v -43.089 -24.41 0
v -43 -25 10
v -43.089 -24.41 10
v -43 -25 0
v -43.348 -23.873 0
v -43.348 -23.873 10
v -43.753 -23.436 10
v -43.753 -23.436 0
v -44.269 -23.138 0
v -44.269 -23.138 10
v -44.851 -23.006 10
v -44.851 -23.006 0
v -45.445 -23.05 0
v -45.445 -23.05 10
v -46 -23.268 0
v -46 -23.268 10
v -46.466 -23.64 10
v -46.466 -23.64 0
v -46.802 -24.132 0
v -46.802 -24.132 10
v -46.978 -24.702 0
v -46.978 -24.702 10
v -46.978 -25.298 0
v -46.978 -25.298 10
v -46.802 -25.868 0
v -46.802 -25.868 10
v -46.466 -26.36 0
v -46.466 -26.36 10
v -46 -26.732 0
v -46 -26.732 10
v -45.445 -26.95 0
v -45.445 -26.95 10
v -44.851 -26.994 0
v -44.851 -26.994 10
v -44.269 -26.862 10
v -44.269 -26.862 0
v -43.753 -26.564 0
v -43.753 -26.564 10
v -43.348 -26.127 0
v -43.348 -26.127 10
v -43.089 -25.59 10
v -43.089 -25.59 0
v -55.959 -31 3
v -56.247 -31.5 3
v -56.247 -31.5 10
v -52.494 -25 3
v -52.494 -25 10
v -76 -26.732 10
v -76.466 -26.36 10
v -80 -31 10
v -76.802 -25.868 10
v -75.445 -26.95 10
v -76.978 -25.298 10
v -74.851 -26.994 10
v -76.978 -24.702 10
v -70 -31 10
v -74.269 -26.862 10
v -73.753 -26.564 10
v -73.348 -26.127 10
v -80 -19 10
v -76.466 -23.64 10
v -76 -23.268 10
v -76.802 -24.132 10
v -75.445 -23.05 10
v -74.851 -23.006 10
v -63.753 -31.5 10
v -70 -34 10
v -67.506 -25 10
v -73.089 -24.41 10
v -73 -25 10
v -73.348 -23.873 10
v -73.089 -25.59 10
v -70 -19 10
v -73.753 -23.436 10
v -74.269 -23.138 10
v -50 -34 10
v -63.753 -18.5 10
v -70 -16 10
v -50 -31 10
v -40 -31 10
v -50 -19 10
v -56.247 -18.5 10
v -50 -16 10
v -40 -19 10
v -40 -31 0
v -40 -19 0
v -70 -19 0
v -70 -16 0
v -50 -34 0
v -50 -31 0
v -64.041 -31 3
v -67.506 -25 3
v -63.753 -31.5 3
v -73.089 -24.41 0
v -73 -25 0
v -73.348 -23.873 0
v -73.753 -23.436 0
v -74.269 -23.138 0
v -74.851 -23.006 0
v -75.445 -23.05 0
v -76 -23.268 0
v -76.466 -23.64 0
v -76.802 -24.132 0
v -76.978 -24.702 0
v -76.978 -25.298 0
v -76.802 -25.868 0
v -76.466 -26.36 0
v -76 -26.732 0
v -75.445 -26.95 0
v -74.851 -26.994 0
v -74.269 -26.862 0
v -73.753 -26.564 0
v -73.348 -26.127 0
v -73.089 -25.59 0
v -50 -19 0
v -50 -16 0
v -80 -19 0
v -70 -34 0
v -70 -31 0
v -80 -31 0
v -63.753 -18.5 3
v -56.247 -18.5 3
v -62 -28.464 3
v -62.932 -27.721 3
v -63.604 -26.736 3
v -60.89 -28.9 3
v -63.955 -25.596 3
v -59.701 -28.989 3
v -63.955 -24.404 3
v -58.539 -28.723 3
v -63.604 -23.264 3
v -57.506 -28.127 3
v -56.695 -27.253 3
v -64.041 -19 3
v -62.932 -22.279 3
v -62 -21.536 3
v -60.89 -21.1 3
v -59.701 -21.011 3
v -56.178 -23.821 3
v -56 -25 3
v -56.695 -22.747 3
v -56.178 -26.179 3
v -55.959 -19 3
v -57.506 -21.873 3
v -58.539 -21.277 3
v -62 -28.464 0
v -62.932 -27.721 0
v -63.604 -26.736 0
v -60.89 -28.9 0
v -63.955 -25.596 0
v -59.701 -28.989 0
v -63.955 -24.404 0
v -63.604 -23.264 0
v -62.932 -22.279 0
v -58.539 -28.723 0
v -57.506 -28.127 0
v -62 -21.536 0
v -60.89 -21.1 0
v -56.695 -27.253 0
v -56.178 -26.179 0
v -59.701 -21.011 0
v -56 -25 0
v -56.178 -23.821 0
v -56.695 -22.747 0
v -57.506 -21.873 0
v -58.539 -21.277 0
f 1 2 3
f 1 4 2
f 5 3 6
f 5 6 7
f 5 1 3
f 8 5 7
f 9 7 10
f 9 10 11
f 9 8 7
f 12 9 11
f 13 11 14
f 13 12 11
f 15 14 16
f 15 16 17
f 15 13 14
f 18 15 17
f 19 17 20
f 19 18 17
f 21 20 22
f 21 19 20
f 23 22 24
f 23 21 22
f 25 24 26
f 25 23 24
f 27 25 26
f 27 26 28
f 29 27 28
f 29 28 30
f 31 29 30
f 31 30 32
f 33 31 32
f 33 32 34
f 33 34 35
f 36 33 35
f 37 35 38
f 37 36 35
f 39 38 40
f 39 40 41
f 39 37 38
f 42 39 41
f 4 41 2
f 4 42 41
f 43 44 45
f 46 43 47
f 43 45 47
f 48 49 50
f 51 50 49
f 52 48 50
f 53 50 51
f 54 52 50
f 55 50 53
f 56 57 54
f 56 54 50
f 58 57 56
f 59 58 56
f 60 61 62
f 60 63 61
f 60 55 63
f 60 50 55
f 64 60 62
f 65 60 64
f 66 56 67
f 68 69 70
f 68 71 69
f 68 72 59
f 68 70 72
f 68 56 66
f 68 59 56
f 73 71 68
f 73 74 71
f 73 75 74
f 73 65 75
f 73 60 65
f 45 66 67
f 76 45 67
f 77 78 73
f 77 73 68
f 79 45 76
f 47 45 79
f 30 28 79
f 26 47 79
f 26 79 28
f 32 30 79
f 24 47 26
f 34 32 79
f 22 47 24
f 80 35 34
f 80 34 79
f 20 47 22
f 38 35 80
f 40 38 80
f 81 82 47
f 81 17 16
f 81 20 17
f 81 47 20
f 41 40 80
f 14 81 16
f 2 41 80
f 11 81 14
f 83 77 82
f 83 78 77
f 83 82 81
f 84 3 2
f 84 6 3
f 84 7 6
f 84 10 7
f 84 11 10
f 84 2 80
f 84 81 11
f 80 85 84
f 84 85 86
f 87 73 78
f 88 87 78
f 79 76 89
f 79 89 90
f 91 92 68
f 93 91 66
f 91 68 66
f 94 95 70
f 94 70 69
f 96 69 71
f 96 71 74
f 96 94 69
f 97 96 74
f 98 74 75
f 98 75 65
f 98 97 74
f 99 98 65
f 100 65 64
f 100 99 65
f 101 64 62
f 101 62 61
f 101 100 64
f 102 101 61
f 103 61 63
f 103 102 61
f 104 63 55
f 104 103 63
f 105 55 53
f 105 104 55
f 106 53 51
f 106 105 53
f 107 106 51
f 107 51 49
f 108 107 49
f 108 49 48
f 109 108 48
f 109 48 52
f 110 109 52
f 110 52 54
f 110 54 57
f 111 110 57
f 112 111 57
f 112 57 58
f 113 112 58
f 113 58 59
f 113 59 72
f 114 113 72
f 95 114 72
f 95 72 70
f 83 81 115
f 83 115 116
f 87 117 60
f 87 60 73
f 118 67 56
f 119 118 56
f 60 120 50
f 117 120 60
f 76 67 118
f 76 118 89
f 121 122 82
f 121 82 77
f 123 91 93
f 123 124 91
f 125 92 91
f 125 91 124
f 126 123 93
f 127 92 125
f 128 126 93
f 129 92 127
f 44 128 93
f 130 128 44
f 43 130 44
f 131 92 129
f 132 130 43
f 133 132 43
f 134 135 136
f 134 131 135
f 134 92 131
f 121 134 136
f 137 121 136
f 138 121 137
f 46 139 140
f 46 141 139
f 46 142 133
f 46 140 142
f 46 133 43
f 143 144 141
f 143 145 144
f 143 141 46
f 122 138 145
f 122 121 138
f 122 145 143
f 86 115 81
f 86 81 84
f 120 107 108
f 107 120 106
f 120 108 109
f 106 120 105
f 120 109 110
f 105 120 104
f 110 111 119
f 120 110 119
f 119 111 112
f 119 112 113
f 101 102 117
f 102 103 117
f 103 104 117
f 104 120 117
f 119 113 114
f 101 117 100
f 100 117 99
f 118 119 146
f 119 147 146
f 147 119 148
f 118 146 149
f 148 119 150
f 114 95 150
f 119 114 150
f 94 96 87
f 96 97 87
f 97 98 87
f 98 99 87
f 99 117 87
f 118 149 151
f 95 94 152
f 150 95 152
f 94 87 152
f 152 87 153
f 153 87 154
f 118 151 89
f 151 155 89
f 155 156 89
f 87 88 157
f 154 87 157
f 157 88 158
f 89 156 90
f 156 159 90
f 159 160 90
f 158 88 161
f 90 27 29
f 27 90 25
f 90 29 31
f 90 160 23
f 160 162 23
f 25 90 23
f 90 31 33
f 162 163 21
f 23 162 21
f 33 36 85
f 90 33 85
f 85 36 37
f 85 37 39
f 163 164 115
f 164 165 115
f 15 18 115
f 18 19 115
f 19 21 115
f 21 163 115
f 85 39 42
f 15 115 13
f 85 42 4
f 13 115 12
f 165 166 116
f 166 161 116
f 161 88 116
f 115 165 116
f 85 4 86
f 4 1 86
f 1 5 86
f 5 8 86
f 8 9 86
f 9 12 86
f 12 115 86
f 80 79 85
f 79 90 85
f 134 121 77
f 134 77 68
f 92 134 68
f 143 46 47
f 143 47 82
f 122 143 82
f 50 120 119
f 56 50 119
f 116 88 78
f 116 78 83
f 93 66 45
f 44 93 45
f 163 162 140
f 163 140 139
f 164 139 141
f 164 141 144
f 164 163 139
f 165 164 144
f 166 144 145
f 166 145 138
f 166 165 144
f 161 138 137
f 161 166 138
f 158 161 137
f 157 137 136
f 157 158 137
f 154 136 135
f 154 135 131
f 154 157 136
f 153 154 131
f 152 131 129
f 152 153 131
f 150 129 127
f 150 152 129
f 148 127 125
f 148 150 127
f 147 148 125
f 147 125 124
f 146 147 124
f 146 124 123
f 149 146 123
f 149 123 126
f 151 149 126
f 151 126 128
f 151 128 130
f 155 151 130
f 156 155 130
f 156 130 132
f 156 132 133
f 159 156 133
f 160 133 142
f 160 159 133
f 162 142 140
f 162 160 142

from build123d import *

# Parameters (mm, degrees)
SKETCH1_W           = 40
SKETCH1_H           = 12
SKETCH1_R           = 2
SKETCH1_R_2         = 4
BOSS_EXTRUDE1_DEPTH = 3
SKETCH2_W           = 20
SKETCH2_H           = 18
BOSS_EXTRUDE2_DEPTH = 7
SKETCH2_4_W         = 20
SKETCH2_4_H         = 18
BOSS_EXTRUDE3_DEPTH = 3
SKETCH3_W           = 10
SKETCH3_H           = 12
SKETCH3_R           = 2
BOSS_EXTRUDE4_DEPTH = 7
BOSS_EXTRUDE5_DEPTH = 3


with BuildPart() as part:
    # Sketch1 → Boss-Extrude1 (new body)
    with BuildSketch(Plane.XY):
        with Locations((-60, -25)):
            Rectangle(SKETCH1_W, SKETCH1_H)
        with Locations((-45, -25)):
            Circle(SKETCH1_R, mode=Mode.SUBTRACT)
        with Locations((-75, -25)):
            Circle(SKETCH1_R, mode=Mode.SUBTRACT)
        with Locations((-60, -25)):
            Circle(SKETCH1_R_2, mode=Mode.SUBTRACT)
    extrude(amount=BOSS_EXTRUDE1_DEPTH)

    # Sketch2 → Boss-Extrude2 (add)
    with BuildSketch(Plane.XY.offset(3)):
        with Locations((-60, -25)):
            Rectangle(SKETCH2_W, SKETCH2_H)
        Polygon((-56.24722325, -18.5), (-63.75277675, -18.5), (-67.505553499, -25), (-63.75277675, -31.5), (-56.24722325, -31.5), (-52.494446501, -25), align=None, mode=Mode.SUBTRACT)
    extrude(amount=BOSS_EXTRUDE2_DEPTH)

    # Sketch2<4> → Boss-Extrude3 (add)
    with BuildSketch(Plane.XY.offset(3)):
        with Locations((-60, -25)):
            Rectangle(SKETCH2_4_W, SKETCH2_4_H)
        Polygon((-56.24722325, -18.5), (-63.75277675, -18.5), (-67.505553499, -25), (-63.75277675, -31.5), (-56.24722325, -31.5), (-52.494446501, -25), align=None, mode=Mode.SUBTRACT)
    extrude(amount=-BOSS_EXTRUDE3_DEPTH)

    # Sketch3 → Boss-Extrude4 (add)
    # profile 1 of 6: a face of its own
    with BuildSketch(Plane.XY.offset(3)):
        Polygon((-50, -19), (-55.958548116, -19), (-52.494446501, -25), (-55.958548116, -31), (-50, -31), align=None)
    # profile 2 of 6: a face of its own
    with BuildSketch(Plane.XY.offset(3)):
        Polygon((-64.041451884, -31), (-70, -31), (-70, -34), (-50, -34), (-50, -31), (-55.958548116, -31), (-56.24722325, -31.5), (-63.75277675, -31.5), align=None)
    # profile 3 of 6: a face of its own
    with BuildSketch(Plane.XY.offset(3)):
        Polygon((-64.041451884, -19), (-70, -19), (-70, -31), (-64.041451884, -31), (-67.505553499, -25), align=None)
    # profile 4 of 6: a face of its own
    with BuildSketch(Plane.XY.offset(3)):
        Polygon((-70, -16), (-70, -19), (-64.041451884, -19), (-63.75277675, -18.5), (-56.24722325, -18.5), (-55.958548116, -19), (-50, -19), (-50, -16), align=None)
    # profile 5 of 6: a face of its own
    with BuildSketch(Plane.XY.offset(3)):
        with Locations((-75, -25)):
            Rectangle(SKETCH3_W, SKETCH3_H)
        with Locations((-75, -25)):
            Circle(SKETCH3_R, mode=Mode.SUBTRACT)
    # profile 6 of 6: a face of its own
    with BuildSketch(Plane.XY.offset(3)):
        with Locations((-45, -25)):
            Rectangle(SKETCH3_W, SKETCH3_H)
        with Locations((-45, -25)):
            Circle(SKETCH3_R, mode=Mode.SUBTRACT)
    extrude(amount=BOSS_EXTRUDE4_DEPTH)

    # Sketch3<4> → Boss-Extrude5 (add)
    with BuildSketch(Plane.XY.offset(3)):
        Polygon((-63.75277675, -18.5), (-64.041451884, -19), (-55.958548116, -19), (-56.24722325, -18.5), align=None)
        Polygon((-55.958548116, -31), (-64.041451884, -31), (-63.75277675, -31.5), (-56.24722325, -31.5), align=None)
    extrude(amount=-BOSS_EXTRUDE5_DEPTH)


solid = part.part
